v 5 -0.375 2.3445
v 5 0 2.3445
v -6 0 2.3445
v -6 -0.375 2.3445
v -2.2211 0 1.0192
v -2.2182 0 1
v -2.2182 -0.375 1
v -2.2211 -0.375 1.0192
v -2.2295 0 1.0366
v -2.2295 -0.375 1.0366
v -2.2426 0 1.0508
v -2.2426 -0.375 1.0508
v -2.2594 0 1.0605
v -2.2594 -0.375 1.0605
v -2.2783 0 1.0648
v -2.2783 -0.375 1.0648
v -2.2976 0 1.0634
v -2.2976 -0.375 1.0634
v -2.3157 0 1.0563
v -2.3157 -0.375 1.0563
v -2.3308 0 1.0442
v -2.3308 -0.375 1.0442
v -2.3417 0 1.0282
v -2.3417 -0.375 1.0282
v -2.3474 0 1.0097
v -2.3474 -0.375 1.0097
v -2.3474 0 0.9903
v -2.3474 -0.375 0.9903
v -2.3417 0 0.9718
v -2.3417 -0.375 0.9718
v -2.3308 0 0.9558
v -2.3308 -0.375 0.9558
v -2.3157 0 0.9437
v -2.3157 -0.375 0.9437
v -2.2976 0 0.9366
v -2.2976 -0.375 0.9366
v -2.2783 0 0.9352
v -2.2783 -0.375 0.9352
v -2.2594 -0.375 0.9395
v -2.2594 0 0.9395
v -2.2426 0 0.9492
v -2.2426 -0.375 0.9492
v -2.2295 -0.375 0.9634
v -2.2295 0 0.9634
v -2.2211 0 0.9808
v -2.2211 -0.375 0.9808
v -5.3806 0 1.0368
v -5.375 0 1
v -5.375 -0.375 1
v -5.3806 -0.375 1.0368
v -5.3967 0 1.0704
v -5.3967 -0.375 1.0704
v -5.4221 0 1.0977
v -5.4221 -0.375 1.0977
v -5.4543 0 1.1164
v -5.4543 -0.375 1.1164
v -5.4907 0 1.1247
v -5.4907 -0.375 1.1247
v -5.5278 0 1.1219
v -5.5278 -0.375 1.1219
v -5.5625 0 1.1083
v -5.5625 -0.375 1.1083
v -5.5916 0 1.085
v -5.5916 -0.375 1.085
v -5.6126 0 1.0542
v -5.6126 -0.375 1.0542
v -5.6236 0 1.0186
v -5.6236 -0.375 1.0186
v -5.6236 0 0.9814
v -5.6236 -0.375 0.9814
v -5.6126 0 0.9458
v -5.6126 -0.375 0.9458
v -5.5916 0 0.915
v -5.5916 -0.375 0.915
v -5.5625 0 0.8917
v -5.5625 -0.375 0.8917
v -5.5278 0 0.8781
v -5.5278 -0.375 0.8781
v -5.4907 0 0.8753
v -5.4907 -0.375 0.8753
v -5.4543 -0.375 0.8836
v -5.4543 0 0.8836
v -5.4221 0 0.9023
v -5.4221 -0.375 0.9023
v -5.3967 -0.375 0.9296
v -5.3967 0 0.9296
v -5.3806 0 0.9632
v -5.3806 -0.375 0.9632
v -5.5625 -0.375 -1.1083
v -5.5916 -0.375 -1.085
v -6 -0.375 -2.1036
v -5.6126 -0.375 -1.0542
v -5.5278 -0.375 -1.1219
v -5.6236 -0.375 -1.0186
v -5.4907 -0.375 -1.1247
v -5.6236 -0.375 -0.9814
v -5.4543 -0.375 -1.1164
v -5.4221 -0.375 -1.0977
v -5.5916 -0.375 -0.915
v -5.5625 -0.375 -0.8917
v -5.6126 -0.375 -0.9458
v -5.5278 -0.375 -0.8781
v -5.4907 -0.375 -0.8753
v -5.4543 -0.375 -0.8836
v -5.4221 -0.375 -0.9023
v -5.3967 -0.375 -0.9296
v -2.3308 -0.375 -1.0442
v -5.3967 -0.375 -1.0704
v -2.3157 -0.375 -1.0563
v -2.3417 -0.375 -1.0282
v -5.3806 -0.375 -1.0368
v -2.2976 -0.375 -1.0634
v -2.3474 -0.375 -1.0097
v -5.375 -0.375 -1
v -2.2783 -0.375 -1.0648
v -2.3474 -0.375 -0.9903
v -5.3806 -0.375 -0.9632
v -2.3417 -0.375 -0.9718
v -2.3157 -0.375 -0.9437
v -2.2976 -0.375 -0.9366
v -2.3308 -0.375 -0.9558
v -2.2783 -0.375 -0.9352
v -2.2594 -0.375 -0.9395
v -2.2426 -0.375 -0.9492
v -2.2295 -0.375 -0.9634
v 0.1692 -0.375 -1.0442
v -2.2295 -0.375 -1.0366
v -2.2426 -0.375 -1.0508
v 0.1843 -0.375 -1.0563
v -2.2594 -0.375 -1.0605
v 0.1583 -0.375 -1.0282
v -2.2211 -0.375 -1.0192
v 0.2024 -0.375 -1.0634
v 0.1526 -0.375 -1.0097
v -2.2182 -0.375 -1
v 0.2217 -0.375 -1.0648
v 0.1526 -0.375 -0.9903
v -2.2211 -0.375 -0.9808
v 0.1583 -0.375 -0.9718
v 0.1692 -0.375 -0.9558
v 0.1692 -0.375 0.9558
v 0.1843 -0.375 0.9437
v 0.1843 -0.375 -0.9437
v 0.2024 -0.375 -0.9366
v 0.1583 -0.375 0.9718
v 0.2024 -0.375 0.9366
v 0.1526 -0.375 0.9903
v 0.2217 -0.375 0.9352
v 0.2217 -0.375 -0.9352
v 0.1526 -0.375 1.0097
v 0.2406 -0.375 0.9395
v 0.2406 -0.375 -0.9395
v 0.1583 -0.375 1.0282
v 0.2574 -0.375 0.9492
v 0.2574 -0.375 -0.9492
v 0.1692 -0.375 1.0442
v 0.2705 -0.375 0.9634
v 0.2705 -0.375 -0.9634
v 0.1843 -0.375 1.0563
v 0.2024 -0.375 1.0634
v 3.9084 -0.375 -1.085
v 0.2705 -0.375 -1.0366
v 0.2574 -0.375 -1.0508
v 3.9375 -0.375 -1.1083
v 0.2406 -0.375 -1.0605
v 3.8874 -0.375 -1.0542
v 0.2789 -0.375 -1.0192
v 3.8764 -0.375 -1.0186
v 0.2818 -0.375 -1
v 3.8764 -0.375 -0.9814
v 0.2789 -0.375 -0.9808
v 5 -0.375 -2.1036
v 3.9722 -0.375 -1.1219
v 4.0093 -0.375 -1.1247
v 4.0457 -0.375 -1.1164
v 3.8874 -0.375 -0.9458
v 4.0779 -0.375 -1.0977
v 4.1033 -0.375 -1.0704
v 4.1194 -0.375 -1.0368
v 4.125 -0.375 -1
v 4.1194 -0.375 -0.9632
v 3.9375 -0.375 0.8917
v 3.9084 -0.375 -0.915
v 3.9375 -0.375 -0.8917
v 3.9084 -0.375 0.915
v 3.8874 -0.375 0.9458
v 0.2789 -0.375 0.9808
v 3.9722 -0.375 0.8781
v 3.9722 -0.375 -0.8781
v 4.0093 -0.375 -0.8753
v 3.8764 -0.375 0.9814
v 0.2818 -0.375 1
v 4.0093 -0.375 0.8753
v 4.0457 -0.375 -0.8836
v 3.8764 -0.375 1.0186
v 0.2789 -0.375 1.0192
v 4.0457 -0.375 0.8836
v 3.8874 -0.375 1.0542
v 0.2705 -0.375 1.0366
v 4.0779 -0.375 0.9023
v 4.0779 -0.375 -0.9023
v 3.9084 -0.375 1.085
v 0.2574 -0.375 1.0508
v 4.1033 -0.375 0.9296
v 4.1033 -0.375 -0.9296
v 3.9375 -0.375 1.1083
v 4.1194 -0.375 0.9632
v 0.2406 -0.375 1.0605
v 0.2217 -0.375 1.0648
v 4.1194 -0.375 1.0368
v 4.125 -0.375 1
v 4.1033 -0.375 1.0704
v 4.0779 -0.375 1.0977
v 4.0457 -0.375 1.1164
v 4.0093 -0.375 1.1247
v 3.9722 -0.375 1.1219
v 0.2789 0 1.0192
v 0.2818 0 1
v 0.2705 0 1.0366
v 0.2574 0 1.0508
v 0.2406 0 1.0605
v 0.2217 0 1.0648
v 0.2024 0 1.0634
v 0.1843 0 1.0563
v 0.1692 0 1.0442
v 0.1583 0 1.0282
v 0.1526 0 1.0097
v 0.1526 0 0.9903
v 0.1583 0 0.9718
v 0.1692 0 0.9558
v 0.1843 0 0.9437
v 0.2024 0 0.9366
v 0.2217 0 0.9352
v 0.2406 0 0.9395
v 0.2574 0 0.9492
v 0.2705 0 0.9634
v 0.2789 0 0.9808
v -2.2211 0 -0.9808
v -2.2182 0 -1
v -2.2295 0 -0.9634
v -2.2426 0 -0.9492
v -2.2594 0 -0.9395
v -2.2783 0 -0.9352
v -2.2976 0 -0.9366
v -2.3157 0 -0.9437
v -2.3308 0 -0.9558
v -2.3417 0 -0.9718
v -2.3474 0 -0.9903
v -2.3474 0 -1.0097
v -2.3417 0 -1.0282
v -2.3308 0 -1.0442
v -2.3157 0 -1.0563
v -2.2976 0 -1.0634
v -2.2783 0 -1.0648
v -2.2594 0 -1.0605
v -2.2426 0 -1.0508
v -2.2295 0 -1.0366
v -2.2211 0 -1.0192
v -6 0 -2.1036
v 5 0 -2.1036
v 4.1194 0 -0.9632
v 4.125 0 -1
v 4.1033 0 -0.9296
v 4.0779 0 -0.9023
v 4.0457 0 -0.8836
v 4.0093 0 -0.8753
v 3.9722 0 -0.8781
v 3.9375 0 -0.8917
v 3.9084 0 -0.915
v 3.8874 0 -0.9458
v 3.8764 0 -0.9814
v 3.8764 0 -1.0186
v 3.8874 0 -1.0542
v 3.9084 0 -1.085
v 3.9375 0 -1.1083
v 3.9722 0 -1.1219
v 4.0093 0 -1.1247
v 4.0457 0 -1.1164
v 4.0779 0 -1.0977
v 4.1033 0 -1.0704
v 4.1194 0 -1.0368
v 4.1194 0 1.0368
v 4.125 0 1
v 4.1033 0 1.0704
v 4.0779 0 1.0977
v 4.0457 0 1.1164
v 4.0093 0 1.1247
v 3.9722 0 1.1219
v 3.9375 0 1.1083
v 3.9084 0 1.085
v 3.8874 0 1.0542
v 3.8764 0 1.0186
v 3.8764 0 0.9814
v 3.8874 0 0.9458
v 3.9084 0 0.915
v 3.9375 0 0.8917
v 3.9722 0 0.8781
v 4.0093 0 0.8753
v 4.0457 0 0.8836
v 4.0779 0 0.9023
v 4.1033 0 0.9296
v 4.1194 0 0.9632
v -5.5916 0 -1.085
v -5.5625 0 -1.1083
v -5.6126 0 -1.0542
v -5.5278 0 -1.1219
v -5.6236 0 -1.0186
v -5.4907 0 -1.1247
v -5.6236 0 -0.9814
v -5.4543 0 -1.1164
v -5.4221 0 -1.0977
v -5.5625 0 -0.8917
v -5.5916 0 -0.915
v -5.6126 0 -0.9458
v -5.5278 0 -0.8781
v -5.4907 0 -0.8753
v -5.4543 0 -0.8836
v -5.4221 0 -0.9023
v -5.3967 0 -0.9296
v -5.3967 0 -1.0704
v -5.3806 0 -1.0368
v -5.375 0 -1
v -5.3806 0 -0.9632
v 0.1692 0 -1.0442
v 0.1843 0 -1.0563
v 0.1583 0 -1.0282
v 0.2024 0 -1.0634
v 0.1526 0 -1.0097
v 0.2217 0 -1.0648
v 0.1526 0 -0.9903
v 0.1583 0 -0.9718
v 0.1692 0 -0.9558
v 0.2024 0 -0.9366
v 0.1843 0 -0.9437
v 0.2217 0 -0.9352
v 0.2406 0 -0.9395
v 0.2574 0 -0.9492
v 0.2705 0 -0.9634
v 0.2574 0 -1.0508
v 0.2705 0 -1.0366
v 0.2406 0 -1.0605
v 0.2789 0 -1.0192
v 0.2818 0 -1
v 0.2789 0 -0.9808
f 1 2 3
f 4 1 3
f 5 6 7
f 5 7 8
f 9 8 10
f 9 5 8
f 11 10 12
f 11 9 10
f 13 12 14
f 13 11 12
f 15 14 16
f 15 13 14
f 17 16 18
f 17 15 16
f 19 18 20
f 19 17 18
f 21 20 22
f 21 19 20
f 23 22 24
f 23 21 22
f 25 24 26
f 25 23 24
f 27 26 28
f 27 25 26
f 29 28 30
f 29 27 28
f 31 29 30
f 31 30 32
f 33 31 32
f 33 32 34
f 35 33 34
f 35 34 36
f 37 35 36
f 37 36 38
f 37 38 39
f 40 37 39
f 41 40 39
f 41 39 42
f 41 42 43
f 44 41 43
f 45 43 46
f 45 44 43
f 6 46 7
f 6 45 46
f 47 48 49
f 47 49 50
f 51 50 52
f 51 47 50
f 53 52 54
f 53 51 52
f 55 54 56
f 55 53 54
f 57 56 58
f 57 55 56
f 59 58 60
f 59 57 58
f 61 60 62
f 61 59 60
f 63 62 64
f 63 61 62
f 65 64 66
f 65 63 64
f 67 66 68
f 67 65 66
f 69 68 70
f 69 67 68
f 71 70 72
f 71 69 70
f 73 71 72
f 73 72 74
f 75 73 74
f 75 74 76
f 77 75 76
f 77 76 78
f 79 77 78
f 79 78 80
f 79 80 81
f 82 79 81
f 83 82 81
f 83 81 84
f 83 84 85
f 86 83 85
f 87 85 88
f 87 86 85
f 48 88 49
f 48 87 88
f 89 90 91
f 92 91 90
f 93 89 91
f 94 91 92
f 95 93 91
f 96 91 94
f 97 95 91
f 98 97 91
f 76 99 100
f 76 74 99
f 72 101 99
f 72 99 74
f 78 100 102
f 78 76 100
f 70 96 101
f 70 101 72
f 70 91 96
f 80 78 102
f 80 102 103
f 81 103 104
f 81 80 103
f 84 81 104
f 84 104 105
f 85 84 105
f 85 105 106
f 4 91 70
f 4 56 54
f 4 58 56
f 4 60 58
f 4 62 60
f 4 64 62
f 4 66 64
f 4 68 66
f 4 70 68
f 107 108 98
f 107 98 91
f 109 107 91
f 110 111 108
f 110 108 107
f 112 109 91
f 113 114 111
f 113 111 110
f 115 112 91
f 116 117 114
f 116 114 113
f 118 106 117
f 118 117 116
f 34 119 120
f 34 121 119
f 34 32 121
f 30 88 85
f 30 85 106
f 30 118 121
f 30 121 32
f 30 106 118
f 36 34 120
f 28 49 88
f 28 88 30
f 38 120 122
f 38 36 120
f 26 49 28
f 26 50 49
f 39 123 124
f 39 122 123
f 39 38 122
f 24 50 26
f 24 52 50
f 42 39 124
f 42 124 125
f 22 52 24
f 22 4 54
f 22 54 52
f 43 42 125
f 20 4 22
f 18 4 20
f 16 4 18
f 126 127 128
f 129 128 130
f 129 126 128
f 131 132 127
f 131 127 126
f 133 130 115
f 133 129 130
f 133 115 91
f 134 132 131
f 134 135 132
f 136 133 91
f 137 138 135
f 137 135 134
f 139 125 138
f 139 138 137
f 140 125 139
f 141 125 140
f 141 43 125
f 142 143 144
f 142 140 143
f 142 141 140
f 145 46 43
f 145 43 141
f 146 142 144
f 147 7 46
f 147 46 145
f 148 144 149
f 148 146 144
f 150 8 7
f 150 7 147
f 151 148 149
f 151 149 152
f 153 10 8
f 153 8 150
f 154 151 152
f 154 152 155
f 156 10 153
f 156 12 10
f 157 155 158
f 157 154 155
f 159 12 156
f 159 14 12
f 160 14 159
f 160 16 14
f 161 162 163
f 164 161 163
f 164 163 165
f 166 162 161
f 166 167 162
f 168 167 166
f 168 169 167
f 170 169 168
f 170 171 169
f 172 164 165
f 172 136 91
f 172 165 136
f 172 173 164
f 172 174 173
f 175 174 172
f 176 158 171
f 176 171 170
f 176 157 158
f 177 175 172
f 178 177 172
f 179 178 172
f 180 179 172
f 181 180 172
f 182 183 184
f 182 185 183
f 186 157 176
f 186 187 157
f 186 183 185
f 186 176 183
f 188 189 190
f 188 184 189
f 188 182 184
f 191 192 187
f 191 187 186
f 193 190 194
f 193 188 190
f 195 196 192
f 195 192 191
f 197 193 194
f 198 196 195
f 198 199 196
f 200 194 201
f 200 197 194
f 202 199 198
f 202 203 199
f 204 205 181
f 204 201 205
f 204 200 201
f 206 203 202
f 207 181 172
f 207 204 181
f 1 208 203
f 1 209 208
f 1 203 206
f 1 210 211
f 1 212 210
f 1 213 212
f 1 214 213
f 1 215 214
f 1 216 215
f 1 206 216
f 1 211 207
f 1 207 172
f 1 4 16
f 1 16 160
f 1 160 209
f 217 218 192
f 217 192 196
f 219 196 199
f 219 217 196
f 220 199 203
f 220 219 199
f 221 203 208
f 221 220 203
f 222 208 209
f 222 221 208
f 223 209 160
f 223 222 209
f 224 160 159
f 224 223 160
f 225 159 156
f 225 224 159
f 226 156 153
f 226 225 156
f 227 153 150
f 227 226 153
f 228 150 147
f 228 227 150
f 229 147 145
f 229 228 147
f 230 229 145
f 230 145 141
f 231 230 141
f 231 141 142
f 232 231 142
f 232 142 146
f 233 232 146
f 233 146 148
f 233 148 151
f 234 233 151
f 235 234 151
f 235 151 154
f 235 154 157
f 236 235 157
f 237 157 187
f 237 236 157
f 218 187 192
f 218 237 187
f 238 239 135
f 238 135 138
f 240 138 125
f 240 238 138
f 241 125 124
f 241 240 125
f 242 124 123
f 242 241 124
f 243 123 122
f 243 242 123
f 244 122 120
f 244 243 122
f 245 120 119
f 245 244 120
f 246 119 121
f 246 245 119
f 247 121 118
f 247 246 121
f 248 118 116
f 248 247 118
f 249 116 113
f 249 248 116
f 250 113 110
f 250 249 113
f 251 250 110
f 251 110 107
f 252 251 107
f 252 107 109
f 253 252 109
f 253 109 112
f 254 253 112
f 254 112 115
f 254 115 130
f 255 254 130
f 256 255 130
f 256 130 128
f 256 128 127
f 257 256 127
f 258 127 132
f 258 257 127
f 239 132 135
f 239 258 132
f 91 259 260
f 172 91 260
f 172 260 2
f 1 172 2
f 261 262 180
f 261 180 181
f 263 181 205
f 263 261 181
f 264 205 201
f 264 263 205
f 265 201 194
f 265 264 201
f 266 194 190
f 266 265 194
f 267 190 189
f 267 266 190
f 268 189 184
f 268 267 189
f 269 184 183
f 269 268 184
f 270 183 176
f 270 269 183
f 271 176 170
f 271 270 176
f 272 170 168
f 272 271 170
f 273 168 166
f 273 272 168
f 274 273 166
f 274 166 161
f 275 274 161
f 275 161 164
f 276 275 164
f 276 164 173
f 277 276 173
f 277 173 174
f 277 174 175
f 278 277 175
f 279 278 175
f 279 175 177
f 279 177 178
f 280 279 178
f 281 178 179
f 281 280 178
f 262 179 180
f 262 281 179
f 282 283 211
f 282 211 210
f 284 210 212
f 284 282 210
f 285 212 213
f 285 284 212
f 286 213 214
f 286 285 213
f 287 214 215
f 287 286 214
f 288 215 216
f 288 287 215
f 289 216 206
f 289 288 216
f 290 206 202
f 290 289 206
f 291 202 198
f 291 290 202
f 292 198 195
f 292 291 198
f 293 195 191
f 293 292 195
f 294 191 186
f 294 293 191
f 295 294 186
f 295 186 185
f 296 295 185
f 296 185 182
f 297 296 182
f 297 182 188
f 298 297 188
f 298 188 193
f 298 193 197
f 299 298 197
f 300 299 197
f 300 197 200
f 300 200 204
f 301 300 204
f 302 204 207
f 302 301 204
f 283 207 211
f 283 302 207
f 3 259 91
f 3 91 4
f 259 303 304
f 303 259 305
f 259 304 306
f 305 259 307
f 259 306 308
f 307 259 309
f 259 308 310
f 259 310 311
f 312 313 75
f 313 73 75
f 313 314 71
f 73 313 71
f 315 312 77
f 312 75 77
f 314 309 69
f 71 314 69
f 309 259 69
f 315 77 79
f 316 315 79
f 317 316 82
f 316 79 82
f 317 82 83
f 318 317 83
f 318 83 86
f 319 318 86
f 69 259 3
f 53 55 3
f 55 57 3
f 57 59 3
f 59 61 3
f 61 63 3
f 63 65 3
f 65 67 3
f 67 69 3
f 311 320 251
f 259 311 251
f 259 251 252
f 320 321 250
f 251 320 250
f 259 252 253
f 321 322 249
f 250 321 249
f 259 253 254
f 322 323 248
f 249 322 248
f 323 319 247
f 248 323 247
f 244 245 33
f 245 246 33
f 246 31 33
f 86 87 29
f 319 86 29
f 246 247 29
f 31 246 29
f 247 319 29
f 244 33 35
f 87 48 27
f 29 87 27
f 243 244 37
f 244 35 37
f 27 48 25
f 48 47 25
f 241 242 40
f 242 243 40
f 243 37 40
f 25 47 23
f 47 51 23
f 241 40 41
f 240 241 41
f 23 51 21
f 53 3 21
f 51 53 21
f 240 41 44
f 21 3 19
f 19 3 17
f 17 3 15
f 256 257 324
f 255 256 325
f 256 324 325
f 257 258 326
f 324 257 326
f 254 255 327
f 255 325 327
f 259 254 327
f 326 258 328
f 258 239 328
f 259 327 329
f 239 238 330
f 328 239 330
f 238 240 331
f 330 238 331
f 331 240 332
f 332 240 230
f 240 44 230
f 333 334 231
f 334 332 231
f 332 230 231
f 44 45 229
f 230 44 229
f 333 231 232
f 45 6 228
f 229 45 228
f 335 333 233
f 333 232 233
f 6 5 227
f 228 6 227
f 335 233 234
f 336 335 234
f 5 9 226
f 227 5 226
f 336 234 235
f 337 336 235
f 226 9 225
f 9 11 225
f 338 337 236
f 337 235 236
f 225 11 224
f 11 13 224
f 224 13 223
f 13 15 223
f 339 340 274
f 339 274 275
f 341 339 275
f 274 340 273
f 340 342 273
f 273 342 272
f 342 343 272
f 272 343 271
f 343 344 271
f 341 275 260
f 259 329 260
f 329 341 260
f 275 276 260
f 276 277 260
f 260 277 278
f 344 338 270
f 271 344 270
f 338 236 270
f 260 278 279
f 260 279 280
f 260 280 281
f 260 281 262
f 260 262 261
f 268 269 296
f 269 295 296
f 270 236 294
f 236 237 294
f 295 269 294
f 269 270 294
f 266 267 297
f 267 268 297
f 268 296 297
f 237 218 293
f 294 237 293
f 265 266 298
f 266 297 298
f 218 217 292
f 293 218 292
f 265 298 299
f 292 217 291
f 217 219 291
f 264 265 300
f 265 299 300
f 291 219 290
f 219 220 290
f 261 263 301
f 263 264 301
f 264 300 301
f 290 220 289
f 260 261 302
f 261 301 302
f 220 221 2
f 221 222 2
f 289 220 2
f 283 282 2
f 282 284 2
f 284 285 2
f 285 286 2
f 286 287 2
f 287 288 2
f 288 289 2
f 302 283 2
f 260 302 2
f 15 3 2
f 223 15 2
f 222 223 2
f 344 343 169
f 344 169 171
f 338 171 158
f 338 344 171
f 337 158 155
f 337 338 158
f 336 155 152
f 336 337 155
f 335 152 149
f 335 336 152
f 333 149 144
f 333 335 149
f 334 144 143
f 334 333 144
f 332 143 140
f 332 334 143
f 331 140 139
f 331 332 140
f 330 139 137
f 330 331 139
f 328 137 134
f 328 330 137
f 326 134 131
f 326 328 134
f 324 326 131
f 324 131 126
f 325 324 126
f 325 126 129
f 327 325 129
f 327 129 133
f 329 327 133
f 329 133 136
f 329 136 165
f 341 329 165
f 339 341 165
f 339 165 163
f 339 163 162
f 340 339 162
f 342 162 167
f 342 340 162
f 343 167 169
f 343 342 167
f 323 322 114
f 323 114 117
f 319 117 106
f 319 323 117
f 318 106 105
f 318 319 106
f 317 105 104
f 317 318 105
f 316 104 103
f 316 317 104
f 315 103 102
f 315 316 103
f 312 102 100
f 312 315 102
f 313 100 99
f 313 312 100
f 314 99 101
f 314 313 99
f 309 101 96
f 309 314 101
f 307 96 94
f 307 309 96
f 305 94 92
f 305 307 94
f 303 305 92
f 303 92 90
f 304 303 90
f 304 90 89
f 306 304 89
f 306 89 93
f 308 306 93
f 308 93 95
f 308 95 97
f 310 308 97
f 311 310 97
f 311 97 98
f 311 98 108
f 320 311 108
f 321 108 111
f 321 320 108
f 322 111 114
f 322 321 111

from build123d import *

# Parameters (mm, degrees)
F0_W     = 6
F0_H     = 4.448176
F0_R     = 0.125
F0_R_2   = 0.065
F0_W_2   = 5
F1_DEPTH = 0.375


with BuildPart() as f1:
    # F0 (on Front) → F1 (new body)
    with BuildSketch(Plane.XZ):
        with Locations((-3, 0.120438)):
            Rectangle(F0_W, F0_H)
        with Locations((-5.5, -1)):
            Circle(F0_R, mode=Mode.SUBTRACT)
        with Locations((-2.283164, -1)):
            Circle(F0_R_2, mode=Mode.SUBTRACT)
        with Locations((-5.5, 1)):
            Circle(F0_R, mode=Mode.SUBTRACT)
        with Locations((-2.283164, 1)):
            Circle(F0_R_2, mode=Mode.SUBTRACT)
        with Locations((2.5, 0.120438)):
            Rectangle(F0_W_2, F0_H)
        with Locations((0.216836, -1)):
            Circle(F0_R_2, mode=Mode.SUBTRACT)
        with Locations((4, -1)):
            Circle(F0_R, mode=Mode.SUBTRACT)
        with Locations((0.216836, 1)):
            Circle(F0_R_2, mode=Mode.SUBTRACT)
        with Locations((4, 1)):
            Circle(F0_R, mode=Mode.SUBTRACT)
    extrude(amount=F1_DEPTH)


solid = f1.part
